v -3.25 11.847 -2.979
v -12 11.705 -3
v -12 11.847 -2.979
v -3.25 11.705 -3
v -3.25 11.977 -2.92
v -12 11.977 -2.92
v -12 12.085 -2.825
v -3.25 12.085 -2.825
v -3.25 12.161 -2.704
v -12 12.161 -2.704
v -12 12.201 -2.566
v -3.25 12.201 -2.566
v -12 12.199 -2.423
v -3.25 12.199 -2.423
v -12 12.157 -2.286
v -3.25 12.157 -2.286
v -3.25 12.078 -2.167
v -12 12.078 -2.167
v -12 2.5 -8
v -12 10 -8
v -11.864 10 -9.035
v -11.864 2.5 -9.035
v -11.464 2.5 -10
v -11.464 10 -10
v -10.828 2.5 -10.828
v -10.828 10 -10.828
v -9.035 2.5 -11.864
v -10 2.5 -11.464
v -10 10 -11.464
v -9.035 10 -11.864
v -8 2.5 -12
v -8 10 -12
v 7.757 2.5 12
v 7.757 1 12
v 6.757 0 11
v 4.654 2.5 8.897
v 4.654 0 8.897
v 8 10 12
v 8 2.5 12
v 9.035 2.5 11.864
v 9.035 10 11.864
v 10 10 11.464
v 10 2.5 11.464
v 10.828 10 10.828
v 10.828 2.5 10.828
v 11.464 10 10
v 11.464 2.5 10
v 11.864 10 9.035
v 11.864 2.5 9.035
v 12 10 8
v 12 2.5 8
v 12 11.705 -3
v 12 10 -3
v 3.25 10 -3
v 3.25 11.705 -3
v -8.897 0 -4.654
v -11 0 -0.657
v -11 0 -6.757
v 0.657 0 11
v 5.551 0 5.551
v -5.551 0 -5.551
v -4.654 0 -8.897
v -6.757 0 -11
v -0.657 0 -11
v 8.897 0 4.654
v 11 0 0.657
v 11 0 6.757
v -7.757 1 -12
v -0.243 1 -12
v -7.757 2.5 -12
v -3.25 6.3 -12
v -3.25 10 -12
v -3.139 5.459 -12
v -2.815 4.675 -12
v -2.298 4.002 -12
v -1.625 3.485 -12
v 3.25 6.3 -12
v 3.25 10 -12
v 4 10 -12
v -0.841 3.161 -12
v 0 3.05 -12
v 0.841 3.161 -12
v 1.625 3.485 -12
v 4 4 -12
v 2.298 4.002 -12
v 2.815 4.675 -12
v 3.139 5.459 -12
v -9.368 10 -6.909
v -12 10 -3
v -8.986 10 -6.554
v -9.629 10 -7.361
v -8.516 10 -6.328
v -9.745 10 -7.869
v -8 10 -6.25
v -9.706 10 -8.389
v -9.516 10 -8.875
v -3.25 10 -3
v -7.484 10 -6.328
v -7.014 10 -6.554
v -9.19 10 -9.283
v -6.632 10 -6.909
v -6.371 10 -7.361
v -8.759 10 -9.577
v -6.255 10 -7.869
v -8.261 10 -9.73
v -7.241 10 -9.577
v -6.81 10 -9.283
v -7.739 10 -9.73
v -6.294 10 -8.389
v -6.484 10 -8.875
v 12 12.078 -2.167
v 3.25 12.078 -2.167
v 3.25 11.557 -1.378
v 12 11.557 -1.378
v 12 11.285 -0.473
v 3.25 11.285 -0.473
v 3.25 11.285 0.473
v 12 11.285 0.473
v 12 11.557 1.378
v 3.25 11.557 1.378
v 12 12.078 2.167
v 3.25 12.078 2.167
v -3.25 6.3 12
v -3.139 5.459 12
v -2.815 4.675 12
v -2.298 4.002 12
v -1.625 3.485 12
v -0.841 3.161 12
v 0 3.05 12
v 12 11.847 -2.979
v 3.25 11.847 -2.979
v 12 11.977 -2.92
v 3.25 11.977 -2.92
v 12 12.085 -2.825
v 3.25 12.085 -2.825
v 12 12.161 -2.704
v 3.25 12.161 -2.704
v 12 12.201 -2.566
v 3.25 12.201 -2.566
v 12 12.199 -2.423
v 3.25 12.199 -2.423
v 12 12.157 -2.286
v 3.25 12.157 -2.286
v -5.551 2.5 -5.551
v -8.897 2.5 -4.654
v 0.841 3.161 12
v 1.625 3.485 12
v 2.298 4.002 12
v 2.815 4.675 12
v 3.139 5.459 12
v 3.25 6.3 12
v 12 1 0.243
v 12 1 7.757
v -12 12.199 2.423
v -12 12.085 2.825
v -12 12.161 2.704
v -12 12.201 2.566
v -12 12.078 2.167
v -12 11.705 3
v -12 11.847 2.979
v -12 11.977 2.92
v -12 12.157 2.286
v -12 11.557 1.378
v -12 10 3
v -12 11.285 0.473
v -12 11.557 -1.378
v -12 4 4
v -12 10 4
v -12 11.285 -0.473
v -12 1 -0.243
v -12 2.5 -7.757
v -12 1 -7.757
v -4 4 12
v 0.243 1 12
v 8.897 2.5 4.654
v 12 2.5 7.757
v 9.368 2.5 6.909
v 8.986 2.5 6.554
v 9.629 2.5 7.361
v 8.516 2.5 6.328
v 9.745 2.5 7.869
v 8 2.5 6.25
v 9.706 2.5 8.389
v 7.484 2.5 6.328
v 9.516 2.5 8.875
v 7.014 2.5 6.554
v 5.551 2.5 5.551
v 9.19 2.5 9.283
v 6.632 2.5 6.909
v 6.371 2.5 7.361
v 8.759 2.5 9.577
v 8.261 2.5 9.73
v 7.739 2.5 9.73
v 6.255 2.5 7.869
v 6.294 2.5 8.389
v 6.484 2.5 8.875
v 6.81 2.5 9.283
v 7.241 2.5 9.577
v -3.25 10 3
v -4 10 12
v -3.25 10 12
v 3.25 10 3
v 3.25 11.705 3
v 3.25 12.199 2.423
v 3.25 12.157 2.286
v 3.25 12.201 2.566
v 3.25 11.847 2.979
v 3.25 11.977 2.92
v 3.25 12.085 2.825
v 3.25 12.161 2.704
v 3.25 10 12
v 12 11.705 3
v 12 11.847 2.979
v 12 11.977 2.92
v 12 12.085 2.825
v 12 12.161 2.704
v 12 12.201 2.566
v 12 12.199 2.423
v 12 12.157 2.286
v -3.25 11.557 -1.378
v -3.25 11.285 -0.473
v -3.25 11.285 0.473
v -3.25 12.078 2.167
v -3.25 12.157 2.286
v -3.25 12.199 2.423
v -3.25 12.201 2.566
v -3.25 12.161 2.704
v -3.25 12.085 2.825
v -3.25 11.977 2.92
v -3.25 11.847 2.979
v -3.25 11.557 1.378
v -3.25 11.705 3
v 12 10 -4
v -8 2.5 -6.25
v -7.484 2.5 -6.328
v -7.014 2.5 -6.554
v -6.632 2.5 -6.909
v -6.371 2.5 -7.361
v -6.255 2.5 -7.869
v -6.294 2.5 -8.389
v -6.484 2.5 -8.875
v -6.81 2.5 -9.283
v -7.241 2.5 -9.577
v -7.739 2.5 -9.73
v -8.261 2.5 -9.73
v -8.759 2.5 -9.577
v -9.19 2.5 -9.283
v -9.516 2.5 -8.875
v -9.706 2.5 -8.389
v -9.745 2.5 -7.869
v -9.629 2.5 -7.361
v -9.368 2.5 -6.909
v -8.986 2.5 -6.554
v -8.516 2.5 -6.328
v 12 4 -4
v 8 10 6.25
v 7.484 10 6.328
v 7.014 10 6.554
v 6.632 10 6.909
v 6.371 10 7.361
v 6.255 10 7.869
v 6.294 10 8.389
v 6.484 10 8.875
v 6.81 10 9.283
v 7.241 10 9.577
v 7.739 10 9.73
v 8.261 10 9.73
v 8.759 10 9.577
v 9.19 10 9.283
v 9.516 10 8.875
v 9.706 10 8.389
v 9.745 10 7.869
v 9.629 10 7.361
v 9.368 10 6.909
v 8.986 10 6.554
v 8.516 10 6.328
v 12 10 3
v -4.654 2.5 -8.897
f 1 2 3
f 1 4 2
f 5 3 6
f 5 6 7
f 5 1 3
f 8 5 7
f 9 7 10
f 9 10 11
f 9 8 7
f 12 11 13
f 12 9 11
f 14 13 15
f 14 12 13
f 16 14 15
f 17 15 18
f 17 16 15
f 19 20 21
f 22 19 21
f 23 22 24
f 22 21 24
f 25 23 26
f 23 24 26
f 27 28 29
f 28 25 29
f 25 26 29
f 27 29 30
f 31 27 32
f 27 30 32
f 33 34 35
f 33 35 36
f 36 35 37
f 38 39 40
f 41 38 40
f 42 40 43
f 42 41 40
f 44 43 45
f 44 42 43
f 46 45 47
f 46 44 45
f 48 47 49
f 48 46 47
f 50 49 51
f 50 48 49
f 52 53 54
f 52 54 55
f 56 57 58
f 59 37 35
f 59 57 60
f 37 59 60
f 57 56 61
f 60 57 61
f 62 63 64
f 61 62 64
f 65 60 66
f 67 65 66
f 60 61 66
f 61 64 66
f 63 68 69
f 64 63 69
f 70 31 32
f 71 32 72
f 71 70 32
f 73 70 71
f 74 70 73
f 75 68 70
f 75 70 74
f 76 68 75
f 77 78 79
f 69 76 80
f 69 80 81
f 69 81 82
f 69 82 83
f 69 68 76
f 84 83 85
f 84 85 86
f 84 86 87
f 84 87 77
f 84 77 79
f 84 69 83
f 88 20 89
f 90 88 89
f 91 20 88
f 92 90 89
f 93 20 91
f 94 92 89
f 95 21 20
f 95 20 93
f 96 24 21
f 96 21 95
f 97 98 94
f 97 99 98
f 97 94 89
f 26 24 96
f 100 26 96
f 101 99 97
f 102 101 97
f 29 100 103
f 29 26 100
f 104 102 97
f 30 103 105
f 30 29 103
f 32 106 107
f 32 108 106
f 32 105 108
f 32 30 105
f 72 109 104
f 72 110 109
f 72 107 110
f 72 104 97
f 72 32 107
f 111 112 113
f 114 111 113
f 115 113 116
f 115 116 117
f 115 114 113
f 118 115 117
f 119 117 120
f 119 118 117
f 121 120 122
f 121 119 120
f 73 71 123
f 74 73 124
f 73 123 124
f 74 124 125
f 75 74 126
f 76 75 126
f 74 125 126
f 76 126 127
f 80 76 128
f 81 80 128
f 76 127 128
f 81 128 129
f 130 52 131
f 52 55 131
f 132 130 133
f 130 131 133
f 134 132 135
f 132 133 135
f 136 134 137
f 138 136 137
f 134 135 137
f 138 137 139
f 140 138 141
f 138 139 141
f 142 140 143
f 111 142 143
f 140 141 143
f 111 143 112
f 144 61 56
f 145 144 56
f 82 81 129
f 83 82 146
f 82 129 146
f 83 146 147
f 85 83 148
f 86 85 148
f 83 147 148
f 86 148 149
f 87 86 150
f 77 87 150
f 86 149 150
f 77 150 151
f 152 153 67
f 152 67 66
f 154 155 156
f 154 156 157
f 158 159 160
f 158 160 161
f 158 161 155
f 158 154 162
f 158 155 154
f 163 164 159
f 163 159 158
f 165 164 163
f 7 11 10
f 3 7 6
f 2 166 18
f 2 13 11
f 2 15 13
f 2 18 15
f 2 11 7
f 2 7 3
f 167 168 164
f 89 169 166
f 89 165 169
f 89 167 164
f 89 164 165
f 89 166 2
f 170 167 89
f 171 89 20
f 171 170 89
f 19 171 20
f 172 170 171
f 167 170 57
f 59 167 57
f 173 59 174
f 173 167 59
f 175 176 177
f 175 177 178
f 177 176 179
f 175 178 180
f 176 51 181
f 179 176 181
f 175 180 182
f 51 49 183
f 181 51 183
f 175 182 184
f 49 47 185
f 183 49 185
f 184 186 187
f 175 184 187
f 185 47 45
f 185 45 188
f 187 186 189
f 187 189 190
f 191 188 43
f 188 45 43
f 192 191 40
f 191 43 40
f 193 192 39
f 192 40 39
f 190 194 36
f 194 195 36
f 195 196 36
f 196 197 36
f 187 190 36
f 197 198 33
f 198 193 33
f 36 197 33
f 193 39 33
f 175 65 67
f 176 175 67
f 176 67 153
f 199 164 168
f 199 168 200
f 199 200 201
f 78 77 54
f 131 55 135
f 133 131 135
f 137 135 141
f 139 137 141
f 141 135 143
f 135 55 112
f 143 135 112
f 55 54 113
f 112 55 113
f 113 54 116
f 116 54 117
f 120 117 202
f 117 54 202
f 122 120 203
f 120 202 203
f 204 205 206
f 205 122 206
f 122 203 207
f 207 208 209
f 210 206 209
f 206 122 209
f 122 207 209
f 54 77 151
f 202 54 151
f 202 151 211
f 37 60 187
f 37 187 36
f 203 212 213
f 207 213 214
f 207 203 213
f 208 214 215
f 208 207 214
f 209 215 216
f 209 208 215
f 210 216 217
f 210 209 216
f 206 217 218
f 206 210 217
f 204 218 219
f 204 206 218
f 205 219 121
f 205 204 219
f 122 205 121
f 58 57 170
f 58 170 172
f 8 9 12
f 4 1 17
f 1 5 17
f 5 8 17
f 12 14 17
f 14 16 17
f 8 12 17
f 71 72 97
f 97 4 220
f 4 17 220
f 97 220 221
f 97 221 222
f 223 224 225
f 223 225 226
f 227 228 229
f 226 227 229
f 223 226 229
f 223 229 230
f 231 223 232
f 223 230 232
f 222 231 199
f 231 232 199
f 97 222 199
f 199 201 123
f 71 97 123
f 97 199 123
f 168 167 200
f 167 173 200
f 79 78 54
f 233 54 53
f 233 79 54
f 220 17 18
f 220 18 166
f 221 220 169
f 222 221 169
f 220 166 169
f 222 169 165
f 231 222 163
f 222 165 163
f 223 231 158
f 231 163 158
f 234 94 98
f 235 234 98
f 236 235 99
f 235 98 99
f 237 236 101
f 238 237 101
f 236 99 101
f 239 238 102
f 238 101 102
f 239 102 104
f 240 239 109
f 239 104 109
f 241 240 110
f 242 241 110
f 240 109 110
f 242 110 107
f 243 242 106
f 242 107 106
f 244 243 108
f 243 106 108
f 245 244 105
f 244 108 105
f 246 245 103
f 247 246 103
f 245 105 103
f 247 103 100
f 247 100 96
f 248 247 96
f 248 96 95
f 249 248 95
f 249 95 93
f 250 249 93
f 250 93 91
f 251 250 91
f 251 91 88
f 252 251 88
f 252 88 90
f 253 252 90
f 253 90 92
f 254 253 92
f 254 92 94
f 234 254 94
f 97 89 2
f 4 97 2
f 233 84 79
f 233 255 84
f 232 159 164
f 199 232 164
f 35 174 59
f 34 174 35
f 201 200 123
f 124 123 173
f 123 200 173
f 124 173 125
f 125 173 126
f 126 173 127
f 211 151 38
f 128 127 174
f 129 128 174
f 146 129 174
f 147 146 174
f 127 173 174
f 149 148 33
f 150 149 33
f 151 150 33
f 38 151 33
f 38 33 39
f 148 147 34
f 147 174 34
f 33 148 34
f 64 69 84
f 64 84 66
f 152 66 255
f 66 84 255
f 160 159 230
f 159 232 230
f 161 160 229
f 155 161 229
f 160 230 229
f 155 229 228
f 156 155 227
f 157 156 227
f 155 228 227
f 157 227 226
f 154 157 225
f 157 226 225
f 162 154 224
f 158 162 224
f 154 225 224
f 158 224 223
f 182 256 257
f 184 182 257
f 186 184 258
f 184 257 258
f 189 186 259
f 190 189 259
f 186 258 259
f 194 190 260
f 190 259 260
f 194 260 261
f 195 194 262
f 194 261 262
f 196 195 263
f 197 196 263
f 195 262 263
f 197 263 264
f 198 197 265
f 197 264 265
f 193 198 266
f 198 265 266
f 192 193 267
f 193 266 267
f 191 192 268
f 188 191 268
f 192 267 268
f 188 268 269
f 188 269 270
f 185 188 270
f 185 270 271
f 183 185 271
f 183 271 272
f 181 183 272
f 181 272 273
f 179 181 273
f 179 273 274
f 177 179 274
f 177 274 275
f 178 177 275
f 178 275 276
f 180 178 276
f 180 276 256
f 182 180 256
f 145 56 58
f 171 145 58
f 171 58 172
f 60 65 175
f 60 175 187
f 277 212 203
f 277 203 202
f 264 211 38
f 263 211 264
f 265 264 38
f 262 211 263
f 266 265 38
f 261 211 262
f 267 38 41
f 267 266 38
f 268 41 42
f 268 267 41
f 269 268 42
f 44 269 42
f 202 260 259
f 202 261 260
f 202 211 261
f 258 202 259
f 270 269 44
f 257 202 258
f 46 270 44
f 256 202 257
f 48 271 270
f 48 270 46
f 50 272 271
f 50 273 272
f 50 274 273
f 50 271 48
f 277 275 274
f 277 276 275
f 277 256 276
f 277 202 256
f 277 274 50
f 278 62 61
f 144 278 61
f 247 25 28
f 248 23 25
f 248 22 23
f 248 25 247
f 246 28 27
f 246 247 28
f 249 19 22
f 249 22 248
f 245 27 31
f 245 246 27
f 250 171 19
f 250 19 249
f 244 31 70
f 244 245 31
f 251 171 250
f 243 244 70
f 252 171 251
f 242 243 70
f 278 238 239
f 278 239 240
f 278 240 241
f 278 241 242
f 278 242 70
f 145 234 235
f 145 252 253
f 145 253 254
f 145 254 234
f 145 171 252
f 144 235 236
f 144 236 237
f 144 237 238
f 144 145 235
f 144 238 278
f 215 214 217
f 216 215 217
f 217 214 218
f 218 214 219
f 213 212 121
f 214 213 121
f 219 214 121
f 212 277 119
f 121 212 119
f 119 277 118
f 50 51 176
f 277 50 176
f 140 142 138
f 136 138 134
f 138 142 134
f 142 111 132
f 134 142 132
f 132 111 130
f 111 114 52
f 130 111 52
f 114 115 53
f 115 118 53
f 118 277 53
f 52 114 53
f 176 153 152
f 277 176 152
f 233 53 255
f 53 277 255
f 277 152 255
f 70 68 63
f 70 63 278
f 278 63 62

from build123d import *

# Parameters (mm, degrees)
SKETCH_1_W               = 24
SKETCH_1_H               = 24
EXTRUDE_1_DEPTH          = 10
CUT_EXTRUDE_1_DEPTH      = 29.635642127
CUT_EXTRUDE_1_DEPTH_BACK = 29.635642127
EXTRUDE_2_DEPTH          = 8.75
SKETCH_5_R               = 1.75
CUT_EXTRUDE_3_DEPTH      = 20.697715604
CHAMFER_1_SIZE           = 8
FILLET_1_R               = 4
FILLET_2_R               = 0.5
CHAMFER_2_SIZE           = 4
SKETCH_6_R               = 1.75
CUT_EXTRUDE_4_DEPTH      = 2.5
CHAMFER_3_SIZE           = 1


with BuildPart() as part:
    # 草图1 → 凸台-拉伸1 (new body)
    with BuildSketch(Plane(origin=(0, 0, 0), x_dir=(1, 0, 0), z_dir=(0, 1, 0))):
        Rectangle(SKETCH_1_W, SKETCH_1_H)
    extrude(amount=EXTRUDE_1_DEPTH)

    # 草图2 → 切除-拉伸1 (cut, two sides)
    with BuildSketch(Plane.XY.offset(12)) as cut_extrude_1_sk:
        with BuildLine():
            Line((-3.25, 10), (-3.25, 6.3))
            ThreePointArc((-3.25, 6.3), (-2.298097039, 8.598097039), (0, 9.55))
            Line((0, 9.55), (0, 10))
            Line((0, 10), (-3.25, 10))
        make_face()
        with BuildLine():
            ThreePointArc((0, 9.55), (2.298097039, 8.598097039), (3.25, 6.3))
            Line((3.25, 6.3), (3.25, 10))
            Line((3.25, 10), (0, 10))
            Line((0, 10), (0, 9.55))
        make_face()
        with BuildLine():
            ThreePointArc((-3.25, 6.3), (-2.298097039, 4.001902961), (0, 3.05))
            Line((0, 3.05), (0, 6.3))
            Line((0, 6.3), (-3.25, 6.3))
        make_face()
        with BuildLine():
            Line((0, 6.3), (0, 3.05))
            ThreePointArc((0, 3.05), (2.298097039, 4.001902961), (3.25, 6.3))
            Line((3.25, 6.3), (0, 6.3))
        make_face()
        with BuildLine():
            Line((-3.25, 6.3), (0, 6.3))
            Line((0, 6.3), (0, 9.55))
            ThreePointArc((0, 9.55), (-2.298097039, 8.598097039), (-3.25, 6.3))
        make_face()
        with BuildLine():
            Line((0, 9.55), (0, 6.3))
            Line((0, 6.3), (3.25, 6.3))
            ThreePointArc((3.25, 6.3), (2.298097039, 8.598097039), (0, 9.55))
        make_face()
    extrude(amount=CUT_EXTRUDE_1_DEPTH, mode=Mode.SUBTRACT)
    extrude(cut_extrude_1_sk.sketch, amount=-CUT_EXTRUDE_1_DEPTH_BACK, mode=Mode.SUBTRACT)

    # 草图4 → 凸台-拉伸2 (add)
    with BuildSketch(Plane(origin=(12, 0, 0), x_dir=(0, 0, -1), z_dir=(1, 0, 0))):
        with BuildLine():
            Line((-3, 10), (3, 10))
            Line((3, 10), (3, 13.25))
            ThreePointArc((3, 13.25), (0, 11.25), (-3, 13.25))
            Line((-3, 13.25), (-3, 10))
        make_face()
    extrude_2 = extrude(amount=-EXTRUDE_2_DEPTH)

    # 镜向2: 凸台-拉伸2 across plane
    add(extrude_2.mirror(Plane(origin=(0, 0, 0), x_dir=(0, 0, 1), z_dir=(1, 0, 0))))

    # 草图5 → 切除-拉伸3 (cut, through all)
    with BuildSketch(Plane(origin=(0, 10, 0), x_dir=(1, 0, 0), z_dir=(0, 1, 0))):
        with Locations(Location((-8, 8, 0), (0, 0, 270))):
            Circle(SKETCH_5_R)
        with Locations(Location((8, -8, 0), (0, 0, 90))):
            Circle(SKETCH_5_R)
    extrude(amount=-CUT_EXTRUDE_3_DEPTH, mode=Mode.SUBTRACT)

    # 倒角1
    chamfer_1_edges = [part.edges().sort_by_distance(p)[0] for p in [
        (-12, 5, 12),
        (12, 5, -12),
    ]]
    chamfer(chamfer_1_edges, length=CHAMFER_1_SIZE)

    # 圆角1
    fillet_1_edges = [part.edges().sort_by_distance(p)[0] for p in [
        (12, 5, 12),
        (-12, 5, -12),
    ]]
    fillet(fillet_1_edges, radius=FILLET_1_R)

    # 圆角2
    fillet_2_edges = [part.edges().sort_by_distance(p)[0] for p in [
        (7.625, 13.25, 3),
        (7.625, 13.25, -3),
        (-7.625, 13.25, -3),
        (-7.625, 13.25, 3),
    ]]
    fillet(fillet_2_edges, radius=FILLET_2_R)

    # 倒角2
    chamfer_2_edges = [part.edges().sort_by_distance(p)[0] for p in [
        (-8, 0, 8),
        (8, 0, -8),
    ]]
    chamfer(chamfer_2_edges, length=CHAMFER_2_SIZE)

    # 草图6 → 切除-拉伸4 (cut)
    with BuildSketch(Plane.XZ):
        Polygon((-8.896575472, -4.653934785), (-11.346065215, -7.103424528), (-7.103424528, -11.346065215), (-4.653934785, -8.896575472), (-5.550510257, -5.550510257), align=None)
        with Locations(Location((-8, -8, 0), (0, 0, 90))):
            Circle(SKETCH_6_R, mode=Mode.SUBTRACT)
        with BuildLine():
            Line((-12, -8), (-12, -7.757359313))
            Line((-12, -7.757359313), (-18.417133027, -14.17449234))
            Line((-18.417133027, -14.17449234), (-14.17449234, -18.417133027))
            Line((-14.17449234, -18.417133027), (-7.757359313, -12))
            Line((-7.757359313, -12), (-8, -12))
            ThreePointArc((-8, -12), (-10.828427125, -10.828427125), (-12, -8))
        make_face()
        with Locations(Location((-8, -8, 0), (0, 0, 90))):
            Circle(SKETCH_6_R)
        Polygon((-11.346065215, -7.103424528), (-7.103424528, -11.346065215), (-10.449489743, -10.449489743), align=None)
        with BuildLine():
            Line((-10.449489743, -10.449489743), (-11.346065215, -7.103424528))
            Line((-11.346065215, -7.103424528), (-12, -7.757359313))
            Line((-12, -7.757359313), (-12, -8))
            ThreePointArc((-12, -8), (-10.828427125, -10.828427125), (-8, -12))
            Line((-8, -12), (-7.757359313, -12))
            Line((-7.757359313, -12), (-7.103424528, -11.346065215))
            Line((-7.103424528, -11.346065215), (-10.449489743, -10.449489743))
        make_face()
        Polygon((5.550510257, 5.550510257), (4.653934785, 8.896575472), (7.103424528, 11.346065215), (11.346065215, 7.103424528), (8.896575472, 4.653934785), align=None)
        with Locations(Location((8, 8, 0), (0, 0, 270))):
            Circle(SKETCH_6_R, mode=Mode.SUBTRACT)
        with Locations(Location((8, 8, 0), (0, 0, 270))):
            Circle(SKETCH_6_R)
        Polygon((7.103424528, 11.346065215), (10.449489743, 10.449489743), (11.346065215, 7.103424528), align=None)
        with BuildLine():
            Line((8, 12), (7.757359313, 12))
            Line((7.757359313, 12), (7.103424528, 11.346065215))
            Line((7.103424528, 11.346065215), (10.449489743, 10.449489743))
            Line((10.449489743, 10.449489743), (11.346065215, 7.103424528))
            Line((11.346065215, 7.103424528), (12, 7.757359313))
            Line((12, 7.757359313), (12, 8))
            ThreePointArc((12, 8), (10.828427125, 10.828427125), (8, 12))
        make_face()
        with BuildLine():
            Line((18.417133027, 14.17449234), (14.17449234, 18.417133027))
            Line((14.17449234, 18.417133027), (7.757359313, 12))
            Line((7.757359313, 12), (8, 12))
            ThreePointArc((8, 12), (10.828427125, 10.828427125), (12, 8))
            Line((12, 8), (12, 7.757359313))
            Line((12, 7.757359313), (18.417133027, 14.17449234))
        make_face()
    extrude(amount=-CUT_EXTRUDE_4_DEPTH, mode=Mode.SUBTRACT)

    # 倒角3
    chamfer_3_edges = [part.edges().sort_by_distance(p)[0] for p in [
        (4.707106781, 0, 12),
        (-4.707106781, 0, -12),
        (12, 0, 4.707106781),
        (-12, 0, -4.707106781),
    ]]
    chamfer(chamfer_3_edges, length=CHAMFER_3_SIZE)


solid = part.part
